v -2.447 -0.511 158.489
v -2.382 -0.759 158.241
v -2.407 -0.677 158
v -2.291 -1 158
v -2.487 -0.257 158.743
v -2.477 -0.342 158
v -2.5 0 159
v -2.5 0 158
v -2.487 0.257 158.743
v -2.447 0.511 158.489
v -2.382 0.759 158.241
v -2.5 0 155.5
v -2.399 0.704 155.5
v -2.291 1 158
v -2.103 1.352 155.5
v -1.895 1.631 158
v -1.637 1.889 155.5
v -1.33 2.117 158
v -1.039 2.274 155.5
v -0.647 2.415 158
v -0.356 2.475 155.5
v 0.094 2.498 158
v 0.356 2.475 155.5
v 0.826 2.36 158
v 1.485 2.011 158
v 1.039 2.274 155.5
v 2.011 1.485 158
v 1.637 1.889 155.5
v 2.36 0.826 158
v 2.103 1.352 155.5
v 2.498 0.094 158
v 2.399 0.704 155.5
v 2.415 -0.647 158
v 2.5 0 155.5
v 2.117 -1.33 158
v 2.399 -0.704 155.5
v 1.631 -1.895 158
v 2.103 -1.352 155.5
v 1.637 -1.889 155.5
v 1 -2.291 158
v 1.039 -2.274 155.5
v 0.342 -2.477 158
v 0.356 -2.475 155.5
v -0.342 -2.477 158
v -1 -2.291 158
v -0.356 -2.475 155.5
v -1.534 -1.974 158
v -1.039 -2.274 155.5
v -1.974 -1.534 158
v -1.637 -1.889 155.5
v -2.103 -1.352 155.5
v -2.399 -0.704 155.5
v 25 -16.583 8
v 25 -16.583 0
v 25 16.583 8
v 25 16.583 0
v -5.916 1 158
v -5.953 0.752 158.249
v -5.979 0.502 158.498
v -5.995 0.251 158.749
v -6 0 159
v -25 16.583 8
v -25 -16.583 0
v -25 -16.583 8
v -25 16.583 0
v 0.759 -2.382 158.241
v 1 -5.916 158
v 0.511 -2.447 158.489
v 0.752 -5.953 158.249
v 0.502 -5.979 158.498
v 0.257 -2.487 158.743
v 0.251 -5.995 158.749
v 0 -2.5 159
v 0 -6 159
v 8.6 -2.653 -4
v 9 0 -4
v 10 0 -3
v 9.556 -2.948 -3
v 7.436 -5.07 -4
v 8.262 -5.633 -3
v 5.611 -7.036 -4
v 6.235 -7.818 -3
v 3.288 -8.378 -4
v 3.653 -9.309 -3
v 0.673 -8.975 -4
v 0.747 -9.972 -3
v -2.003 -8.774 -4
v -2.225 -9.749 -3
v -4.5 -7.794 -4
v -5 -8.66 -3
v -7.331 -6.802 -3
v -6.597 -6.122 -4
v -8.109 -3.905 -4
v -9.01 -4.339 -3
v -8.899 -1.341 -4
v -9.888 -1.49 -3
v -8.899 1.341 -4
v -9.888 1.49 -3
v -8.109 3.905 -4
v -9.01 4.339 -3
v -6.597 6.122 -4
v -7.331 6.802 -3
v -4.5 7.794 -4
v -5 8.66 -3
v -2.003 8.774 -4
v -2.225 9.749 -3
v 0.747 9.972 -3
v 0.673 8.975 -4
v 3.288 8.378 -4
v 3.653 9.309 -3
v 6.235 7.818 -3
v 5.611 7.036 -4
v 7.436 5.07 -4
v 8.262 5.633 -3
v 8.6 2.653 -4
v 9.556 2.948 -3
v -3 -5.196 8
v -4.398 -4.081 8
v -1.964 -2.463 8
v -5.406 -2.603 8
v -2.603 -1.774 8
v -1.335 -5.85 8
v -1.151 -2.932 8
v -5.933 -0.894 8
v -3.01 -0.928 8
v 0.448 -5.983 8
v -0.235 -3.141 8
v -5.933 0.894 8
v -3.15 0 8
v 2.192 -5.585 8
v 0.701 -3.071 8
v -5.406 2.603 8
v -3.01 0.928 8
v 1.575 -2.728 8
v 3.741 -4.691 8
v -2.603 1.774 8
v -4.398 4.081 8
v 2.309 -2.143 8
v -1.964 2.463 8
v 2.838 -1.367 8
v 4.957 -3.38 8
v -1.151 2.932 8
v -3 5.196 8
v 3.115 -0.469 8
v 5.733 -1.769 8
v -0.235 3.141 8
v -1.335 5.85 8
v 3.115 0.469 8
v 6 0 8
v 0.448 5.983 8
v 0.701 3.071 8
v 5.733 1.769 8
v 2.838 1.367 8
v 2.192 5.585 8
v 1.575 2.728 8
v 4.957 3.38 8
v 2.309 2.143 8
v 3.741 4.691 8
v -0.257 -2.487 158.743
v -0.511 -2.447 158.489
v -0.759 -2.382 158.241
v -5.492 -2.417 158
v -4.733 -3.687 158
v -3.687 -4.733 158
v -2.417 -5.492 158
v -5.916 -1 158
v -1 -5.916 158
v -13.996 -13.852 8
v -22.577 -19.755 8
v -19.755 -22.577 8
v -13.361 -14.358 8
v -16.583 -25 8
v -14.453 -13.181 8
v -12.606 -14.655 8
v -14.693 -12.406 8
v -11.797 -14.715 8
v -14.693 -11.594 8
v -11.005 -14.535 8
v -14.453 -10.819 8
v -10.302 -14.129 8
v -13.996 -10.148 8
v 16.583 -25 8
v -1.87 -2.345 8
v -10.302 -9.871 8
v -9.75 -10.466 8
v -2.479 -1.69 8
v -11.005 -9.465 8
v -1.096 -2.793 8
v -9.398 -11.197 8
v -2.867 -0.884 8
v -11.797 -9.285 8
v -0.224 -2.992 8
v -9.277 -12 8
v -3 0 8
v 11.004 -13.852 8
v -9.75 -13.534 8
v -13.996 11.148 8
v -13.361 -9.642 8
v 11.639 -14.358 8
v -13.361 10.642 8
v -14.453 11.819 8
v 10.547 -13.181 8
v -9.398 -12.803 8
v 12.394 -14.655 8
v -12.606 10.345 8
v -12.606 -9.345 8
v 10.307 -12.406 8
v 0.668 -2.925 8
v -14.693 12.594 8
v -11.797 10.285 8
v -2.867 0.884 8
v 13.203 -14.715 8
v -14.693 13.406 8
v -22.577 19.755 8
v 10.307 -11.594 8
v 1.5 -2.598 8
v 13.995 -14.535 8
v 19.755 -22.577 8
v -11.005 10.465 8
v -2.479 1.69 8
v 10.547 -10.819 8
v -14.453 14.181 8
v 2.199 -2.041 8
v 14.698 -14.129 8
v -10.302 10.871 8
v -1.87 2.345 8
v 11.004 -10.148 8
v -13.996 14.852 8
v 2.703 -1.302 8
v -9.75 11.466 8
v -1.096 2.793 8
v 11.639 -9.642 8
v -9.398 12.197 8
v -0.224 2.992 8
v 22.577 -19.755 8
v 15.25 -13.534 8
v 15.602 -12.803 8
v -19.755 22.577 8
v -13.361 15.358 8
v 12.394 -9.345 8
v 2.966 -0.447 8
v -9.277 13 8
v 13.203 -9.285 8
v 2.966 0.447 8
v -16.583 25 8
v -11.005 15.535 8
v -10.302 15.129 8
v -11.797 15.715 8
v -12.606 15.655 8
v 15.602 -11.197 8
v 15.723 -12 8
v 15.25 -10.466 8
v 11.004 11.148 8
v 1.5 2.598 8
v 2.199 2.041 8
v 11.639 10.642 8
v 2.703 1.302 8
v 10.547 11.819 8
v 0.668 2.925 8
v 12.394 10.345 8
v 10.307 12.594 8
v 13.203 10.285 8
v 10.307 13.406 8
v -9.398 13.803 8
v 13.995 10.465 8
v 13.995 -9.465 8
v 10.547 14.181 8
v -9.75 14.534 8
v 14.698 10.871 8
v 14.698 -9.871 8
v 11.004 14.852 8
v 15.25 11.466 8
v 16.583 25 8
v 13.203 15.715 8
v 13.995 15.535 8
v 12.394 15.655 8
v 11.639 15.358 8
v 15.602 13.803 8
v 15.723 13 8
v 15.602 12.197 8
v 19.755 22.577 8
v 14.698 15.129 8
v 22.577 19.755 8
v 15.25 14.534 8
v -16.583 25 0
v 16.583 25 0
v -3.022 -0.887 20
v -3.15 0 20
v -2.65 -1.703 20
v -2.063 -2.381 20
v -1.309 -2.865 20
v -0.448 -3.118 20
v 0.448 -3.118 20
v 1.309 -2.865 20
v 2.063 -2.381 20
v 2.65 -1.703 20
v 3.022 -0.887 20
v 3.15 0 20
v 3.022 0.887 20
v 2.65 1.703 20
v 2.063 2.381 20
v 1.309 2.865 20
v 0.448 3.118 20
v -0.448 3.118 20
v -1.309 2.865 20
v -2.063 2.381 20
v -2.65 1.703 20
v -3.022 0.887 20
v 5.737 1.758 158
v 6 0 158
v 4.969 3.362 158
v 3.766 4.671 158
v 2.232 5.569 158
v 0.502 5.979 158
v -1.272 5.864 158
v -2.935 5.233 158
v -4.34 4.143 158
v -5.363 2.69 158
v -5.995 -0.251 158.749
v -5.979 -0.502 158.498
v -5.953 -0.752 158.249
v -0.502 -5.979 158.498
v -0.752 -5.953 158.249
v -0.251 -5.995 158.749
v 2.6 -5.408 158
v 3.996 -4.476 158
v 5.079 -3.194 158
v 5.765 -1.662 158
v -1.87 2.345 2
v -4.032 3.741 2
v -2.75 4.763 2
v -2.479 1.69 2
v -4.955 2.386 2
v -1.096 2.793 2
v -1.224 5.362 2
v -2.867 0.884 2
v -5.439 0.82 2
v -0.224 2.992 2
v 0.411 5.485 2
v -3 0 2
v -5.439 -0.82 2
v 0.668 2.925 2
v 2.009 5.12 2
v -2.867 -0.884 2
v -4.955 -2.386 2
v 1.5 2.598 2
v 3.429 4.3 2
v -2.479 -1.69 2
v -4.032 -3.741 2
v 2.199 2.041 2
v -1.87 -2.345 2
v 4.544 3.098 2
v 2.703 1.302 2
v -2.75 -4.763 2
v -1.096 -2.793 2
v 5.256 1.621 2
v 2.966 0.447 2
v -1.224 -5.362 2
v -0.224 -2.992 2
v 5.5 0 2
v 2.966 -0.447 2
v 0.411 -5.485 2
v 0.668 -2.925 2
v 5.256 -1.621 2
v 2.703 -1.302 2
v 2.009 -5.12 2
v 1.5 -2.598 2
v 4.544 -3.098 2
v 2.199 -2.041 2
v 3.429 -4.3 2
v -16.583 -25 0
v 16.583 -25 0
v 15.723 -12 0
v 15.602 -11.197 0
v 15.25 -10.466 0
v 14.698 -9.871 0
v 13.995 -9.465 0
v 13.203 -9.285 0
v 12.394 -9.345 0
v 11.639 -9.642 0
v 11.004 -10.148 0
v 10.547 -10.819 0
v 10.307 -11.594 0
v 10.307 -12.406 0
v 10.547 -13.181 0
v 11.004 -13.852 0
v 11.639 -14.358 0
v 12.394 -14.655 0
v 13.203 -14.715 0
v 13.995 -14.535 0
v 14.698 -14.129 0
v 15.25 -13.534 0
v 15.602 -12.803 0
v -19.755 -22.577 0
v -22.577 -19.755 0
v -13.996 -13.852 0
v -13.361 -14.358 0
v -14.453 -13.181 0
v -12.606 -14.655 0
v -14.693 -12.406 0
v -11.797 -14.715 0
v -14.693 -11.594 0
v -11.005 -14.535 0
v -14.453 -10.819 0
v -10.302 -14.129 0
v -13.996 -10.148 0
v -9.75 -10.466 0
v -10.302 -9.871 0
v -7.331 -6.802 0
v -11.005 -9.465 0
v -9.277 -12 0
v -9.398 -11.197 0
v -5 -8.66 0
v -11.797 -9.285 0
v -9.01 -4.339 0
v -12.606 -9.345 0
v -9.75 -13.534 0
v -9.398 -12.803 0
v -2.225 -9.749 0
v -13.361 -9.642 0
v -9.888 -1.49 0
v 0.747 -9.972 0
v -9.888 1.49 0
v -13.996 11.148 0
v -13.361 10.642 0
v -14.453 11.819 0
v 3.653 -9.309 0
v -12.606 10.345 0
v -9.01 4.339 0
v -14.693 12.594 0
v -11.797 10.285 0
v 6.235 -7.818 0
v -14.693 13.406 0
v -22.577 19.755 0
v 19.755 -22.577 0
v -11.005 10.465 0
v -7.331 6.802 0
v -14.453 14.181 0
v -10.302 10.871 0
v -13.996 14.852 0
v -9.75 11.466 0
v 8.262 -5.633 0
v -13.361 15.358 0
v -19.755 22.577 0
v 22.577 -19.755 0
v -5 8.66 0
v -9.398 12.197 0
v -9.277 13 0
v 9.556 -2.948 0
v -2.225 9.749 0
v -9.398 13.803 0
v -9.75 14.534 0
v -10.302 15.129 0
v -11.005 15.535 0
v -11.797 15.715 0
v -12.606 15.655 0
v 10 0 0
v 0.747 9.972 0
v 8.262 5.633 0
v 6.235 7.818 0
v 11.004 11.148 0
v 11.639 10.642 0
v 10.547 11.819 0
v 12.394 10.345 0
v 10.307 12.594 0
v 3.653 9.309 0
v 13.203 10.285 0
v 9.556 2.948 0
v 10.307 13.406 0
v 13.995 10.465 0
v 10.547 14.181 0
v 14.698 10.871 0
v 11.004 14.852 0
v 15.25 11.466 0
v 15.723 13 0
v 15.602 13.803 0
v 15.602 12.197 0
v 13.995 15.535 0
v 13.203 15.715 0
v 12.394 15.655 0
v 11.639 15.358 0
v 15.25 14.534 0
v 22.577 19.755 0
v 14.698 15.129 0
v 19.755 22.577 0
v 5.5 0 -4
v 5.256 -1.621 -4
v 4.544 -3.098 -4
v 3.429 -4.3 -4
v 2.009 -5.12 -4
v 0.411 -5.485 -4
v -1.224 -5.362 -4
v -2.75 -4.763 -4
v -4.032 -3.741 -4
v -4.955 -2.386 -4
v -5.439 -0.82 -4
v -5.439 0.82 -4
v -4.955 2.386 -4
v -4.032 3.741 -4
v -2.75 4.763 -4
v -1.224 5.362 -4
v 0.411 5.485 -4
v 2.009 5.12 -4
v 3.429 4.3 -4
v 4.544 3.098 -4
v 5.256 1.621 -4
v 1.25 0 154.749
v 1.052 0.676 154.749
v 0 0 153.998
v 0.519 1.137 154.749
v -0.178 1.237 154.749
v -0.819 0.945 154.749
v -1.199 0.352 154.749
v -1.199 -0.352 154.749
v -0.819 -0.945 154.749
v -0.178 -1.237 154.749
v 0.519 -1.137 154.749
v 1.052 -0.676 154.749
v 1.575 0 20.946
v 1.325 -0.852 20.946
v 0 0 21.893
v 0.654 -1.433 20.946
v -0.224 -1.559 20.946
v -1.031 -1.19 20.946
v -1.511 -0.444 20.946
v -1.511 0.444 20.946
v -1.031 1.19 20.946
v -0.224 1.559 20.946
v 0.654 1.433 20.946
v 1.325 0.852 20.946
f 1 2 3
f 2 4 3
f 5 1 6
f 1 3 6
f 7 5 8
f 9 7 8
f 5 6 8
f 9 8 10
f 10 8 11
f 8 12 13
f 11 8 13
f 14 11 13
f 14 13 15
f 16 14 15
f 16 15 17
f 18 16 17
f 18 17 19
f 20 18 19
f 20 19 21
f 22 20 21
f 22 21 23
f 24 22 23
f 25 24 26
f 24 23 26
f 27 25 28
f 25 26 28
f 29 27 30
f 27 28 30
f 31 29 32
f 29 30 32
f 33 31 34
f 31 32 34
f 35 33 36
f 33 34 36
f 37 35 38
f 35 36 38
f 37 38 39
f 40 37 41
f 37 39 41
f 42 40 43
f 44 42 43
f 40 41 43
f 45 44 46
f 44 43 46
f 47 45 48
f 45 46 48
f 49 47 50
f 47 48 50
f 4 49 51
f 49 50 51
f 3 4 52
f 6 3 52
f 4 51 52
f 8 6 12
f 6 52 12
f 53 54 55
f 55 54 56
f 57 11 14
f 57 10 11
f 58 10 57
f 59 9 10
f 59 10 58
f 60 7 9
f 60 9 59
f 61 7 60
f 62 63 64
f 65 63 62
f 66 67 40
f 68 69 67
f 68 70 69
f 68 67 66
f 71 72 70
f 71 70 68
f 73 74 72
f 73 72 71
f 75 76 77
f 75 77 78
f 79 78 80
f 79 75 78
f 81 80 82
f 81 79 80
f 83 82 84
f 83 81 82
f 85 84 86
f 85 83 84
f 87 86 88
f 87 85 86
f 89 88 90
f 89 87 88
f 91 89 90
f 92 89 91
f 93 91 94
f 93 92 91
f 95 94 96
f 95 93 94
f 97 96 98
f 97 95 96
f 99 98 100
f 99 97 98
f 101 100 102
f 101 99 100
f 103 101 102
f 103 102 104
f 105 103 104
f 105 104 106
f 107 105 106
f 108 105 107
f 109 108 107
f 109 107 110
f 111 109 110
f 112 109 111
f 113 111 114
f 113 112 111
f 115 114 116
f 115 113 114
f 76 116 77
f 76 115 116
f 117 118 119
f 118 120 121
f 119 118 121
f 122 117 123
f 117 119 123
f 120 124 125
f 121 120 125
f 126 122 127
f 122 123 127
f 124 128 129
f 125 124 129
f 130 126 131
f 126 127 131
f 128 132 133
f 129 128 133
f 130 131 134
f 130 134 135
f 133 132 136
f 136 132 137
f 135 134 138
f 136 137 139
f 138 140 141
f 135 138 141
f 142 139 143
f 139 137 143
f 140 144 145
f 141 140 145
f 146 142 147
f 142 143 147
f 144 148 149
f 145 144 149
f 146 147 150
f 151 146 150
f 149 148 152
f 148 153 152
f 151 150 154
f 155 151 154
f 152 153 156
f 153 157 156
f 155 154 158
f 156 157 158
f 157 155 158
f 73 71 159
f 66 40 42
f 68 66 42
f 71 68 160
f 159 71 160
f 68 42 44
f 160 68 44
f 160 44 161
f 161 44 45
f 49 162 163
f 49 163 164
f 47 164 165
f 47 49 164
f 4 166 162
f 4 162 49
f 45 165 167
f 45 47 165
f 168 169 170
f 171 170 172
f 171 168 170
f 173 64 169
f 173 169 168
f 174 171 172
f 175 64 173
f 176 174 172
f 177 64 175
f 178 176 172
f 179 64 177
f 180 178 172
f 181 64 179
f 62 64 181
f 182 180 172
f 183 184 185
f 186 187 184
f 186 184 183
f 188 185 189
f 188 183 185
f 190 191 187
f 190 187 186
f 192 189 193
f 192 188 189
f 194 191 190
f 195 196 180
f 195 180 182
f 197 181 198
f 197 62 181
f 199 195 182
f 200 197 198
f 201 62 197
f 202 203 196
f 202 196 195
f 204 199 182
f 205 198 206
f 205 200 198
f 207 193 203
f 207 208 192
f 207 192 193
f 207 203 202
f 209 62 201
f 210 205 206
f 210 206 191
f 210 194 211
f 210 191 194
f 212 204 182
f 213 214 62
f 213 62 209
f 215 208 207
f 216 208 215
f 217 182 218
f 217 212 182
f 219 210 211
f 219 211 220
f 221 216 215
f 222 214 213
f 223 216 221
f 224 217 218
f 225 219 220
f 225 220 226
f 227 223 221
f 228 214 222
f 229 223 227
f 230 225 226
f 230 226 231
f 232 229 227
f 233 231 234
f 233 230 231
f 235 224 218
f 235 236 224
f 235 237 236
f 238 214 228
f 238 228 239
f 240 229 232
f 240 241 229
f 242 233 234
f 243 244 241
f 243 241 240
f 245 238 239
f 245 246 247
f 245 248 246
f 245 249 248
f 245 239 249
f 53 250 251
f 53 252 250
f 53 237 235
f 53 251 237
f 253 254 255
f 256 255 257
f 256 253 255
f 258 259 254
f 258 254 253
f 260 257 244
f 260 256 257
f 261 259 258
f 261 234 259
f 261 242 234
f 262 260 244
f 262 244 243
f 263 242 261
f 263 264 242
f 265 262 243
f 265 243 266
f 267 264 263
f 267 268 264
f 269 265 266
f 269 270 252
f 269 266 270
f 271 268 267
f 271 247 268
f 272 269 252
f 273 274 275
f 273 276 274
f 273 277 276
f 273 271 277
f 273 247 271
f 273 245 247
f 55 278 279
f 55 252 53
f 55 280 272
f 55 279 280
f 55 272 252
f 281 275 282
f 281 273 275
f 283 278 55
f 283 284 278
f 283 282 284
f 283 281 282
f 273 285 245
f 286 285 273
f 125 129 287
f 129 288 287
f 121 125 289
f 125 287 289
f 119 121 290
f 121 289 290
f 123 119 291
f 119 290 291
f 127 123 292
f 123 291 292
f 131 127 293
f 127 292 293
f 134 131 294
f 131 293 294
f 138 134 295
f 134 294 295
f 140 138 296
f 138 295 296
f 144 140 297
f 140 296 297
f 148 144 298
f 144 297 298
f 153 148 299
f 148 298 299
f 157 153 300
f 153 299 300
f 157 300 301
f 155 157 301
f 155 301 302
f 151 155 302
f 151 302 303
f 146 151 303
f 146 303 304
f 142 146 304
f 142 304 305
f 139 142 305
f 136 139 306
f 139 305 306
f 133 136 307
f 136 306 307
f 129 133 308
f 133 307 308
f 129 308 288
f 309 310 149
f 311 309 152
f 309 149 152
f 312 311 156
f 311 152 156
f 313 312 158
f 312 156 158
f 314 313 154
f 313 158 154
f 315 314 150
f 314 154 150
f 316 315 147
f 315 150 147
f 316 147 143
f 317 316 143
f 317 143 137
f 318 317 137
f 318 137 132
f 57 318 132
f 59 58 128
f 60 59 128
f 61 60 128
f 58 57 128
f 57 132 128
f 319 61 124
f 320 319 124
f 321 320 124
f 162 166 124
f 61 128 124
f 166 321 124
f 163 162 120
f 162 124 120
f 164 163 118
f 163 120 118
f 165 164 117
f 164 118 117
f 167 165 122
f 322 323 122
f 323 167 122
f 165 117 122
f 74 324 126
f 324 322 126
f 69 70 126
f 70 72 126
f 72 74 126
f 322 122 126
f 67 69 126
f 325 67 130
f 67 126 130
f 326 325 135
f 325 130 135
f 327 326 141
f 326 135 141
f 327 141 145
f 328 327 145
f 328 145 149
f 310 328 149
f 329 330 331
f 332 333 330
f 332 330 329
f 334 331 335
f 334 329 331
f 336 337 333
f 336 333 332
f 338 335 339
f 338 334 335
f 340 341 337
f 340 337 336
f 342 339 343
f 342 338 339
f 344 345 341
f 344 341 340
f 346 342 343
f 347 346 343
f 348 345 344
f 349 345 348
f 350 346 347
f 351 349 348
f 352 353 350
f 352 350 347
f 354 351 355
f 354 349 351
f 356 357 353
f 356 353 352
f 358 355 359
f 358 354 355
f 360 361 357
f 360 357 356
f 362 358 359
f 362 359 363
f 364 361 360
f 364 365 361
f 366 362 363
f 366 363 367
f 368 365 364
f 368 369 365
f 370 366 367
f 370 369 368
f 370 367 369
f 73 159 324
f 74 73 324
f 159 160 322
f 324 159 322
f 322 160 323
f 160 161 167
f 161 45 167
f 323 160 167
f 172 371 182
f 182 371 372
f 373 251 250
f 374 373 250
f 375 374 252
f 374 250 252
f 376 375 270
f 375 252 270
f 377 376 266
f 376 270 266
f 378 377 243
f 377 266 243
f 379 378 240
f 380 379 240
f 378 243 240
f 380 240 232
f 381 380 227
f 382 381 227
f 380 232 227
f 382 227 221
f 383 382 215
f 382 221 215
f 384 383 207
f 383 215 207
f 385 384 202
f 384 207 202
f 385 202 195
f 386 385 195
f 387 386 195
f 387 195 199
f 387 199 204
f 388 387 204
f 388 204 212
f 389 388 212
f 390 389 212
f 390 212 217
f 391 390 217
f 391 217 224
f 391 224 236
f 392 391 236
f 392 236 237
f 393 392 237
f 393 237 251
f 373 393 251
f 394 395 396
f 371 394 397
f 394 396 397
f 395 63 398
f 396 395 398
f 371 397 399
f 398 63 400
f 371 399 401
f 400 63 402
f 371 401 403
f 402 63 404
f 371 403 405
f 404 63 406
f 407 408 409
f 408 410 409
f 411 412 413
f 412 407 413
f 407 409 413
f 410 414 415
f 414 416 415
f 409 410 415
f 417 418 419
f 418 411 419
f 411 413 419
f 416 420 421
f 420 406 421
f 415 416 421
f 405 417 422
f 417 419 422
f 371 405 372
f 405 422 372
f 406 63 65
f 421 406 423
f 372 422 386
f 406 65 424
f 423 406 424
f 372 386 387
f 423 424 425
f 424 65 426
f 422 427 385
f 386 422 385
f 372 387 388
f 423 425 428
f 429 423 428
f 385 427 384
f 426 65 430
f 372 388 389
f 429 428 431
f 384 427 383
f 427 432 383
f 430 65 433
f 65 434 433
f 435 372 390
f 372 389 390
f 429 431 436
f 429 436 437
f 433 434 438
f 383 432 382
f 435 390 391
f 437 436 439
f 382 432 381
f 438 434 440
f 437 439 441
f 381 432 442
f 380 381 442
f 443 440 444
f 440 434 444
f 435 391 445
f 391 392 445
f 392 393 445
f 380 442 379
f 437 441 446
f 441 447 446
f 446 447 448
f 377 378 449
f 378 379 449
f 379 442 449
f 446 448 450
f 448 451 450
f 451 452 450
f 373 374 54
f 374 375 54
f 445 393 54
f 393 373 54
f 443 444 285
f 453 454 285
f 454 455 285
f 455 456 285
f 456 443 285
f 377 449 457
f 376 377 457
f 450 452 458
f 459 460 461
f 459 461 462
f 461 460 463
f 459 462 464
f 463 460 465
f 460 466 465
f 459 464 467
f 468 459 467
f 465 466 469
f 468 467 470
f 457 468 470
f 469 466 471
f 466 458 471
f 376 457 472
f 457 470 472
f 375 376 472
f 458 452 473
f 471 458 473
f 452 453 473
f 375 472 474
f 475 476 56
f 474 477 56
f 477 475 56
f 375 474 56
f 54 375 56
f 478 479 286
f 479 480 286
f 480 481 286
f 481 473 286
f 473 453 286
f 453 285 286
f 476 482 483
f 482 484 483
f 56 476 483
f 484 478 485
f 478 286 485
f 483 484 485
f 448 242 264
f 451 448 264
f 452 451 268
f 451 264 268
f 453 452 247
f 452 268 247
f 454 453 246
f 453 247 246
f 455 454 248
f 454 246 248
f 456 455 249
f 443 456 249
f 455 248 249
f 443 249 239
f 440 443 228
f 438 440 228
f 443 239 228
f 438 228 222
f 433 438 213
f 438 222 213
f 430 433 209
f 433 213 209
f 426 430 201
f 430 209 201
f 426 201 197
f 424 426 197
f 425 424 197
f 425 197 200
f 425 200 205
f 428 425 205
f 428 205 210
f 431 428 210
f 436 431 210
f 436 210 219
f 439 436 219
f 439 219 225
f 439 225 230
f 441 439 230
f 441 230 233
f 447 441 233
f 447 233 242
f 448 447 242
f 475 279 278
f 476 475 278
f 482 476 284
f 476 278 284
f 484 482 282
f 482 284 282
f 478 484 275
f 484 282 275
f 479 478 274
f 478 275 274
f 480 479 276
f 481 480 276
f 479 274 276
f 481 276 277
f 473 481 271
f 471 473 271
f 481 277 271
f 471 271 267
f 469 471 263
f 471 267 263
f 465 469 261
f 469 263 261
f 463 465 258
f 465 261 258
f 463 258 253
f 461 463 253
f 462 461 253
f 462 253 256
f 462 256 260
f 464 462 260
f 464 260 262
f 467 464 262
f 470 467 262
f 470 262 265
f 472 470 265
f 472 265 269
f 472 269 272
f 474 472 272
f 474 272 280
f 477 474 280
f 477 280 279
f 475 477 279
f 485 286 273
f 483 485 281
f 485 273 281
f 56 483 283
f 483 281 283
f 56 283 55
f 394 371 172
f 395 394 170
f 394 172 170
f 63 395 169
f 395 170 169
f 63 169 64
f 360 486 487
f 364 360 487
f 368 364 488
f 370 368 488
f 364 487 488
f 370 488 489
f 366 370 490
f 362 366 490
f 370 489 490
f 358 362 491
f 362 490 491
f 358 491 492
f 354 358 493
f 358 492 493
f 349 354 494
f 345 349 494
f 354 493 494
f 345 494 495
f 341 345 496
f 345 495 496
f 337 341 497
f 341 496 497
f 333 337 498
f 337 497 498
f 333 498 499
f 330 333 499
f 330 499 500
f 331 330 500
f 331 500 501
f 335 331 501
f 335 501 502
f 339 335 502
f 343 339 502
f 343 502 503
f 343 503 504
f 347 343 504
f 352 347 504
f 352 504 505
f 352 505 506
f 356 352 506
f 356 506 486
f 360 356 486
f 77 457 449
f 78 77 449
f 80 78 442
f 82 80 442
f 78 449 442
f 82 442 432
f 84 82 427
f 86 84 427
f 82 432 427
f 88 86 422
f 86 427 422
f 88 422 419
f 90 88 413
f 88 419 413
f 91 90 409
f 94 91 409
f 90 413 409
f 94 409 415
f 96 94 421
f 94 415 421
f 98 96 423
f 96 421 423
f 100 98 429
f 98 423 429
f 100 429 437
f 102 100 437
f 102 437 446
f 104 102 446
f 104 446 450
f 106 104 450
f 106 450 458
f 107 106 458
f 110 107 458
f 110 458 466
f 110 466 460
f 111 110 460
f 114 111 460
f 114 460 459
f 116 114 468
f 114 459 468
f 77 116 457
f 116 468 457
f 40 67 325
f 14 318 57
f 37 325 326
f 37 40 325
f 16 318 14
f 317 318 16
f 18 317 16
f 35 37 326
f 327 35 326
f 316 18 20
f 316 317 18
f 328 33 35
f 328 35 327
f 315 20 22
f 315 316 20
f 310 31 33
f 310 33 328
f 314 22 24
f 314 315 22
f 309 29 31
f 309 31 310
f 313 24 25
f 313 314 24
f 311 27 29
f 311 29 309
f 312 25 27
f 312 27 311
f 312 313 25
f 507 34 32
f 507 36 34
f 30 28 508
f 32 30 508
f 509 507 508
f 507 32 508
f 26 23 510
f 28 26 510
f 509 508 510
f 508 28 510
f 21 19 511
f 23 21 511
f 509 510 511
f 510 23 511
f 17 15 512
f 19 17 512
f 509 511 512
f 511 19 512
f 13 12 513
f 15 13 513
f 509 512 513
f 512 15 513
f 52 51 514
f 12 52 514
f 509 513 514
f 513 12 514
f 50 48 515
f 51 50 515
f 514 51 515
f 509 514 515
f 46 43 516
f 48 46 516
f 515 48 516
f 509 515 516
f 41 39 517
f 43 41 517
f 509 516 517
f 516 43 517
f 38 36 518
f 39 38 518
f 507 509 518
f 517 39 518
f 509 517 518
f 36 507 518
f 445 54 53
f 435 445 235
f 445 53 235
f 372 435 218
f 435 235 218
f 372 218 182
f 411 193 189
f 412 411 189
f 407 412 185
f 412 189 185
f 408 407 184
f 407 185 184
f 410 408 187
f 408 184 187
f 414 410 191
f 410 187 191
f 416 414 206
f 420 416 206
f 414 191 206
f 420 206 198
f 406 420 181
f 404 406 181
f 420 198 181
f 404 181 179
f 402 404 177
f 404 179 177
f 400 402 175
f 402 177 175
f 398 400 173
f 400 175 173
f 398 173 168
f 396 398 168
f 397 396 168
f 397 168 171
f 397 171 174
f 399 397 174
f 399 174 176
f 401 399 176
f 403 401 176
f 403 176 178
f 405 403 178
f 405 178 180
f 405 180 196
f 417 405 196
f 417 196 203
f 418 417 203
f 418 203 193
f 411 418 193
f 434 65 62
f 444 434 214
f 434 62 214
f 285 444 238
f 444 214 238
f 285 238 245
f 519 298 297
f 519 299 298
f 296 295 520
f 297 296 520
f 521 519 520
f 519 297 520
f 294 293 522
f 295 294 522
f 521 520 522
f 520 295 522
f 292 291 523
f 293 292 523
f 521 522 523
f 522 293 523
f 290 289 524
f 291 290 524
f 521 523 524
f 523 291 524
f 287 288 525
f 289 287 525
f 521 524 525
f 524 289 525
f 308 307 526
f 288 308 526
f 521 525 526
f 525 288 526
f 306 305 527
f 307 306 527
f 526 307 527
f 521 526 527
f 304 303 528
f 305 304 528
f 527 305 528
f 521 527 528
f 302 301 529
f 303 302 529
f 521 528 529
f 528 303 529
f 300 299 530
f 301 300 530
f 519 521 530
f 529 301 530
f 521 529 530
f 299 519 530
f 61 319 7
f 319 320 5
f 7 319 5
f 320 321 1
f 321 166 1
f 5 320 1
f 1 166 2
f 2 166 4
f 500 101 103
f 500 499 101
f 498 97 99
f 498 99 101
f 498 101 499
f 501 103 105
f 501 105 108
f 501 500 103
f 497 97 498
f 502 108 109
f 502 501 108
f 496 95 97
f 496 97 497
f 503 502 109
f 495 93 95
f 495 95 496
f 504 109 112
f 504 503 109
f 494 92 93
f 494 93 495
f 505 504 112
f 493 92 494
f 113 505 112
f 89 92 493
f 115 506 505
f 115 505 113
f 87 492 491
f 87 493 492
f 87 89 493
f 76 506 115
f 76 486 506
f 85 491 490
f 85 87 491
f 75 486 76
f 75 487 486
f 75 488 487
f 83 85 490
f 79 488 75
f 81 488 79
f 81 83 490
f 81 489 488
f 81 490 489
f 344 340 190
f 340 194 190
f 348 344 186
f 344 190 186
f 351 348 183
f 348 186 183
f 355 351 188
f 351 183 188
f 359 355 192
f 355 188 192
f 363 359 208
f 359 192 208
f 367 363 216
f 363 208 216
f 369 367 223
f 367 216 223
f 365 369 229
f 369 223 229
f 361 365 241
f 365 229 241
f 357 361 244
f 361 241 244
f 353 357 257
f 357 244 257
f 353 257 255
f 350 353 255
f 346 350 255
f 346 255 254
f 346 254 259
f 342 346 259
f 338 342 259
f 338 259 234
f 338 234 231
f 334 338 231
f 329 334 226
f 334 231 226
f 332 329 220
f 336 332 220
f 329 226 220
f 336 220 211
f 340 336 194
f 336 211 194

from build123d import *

# Parameters (mm, degrees)
F0_W            = 50
F0_H            = 50
F1_DEPTH        = 8
F2_R            = 10
F3_DEPTH        = 4
F5_DEPTH        = 25
F4_R            = 6
F6_DEPTH        = 150
F7_R            = 2.7229388177
F8_DEPTH        = 25
F9_SIZE         = 1
F11_D           = 6
F11_CBORE_D     = 11
F11_CBORE_DEPTH = 6
F12_D           = 6.3
F12_DEPTH       = 12
F12_TIP         = 1.8927109499
F14_D           = 5
F14_DEPTH       = 2.5
F14_TIP         = 1.5021515476
F16_DEPTH       = 1
F17_SIZE        = 0.9999


# Not quite as in the source:
# - a fillet or chamfer is up to 0.001 mm smaller than in the source, because OpenCascade refuses the exact size


with BuildPart() as f1:
    # F0 (on Top) → F1 (new body)
    with BuildSketch(Plane.XY):
        Rectangle(F0_W, F0_H)
    extrude(amount=F1_DEPTH)

    # F2 (on face) → F3 (join)
    with BuildSketch(Plane(origin=(0, 0, 0), x_dir=(1, 0, 0), z_dir=(0, 0, -1))):
        Circle(F2_R)
    extrude(amount=F3_DEPTH)

    # F4 (on face) → F5 (cut)
    with BuildSketch(Plane.XY.offset(8)):
        with BuildLine():
            ThreePointArc((16.5831239518, 25), (21.2132034356, 21.2132034356), (25, 16.5831239518))
            Line((25, 16.5831239518), (25, 25))
            Line((25, 25), (16.5831239518, 25))
        make_face()
        with BuildLine():
            Line((25, -25), (25, -16.5831239518))
            ThreePointArc((25, -16.5831239518), (21.2132034356, -21.2132034356), (16.5831239518, -25))
            Line((16.5831239518, -25), (25, -25))
        make_face()
        with BuildLine():
            ThreePointArc((-16.5831239518, -25), (0, -30), (16.5831239518, -25))
            Line((16.5831239518, -25), (-16.5831239518, -25))
        make_face()
        with BuildLine():
            ThreePointArc((-25, 16.5831239518), (-21.2132034356, 21.2132034356), (-16.5831239518, 25))
            Line((-16.5831239518, 25), (-25, 25))
            Line((-25, 25), (-25, 16.5831239518))
        make_face()
        with BuildLine():
            Line((-25, -25), (-16.5831239518, -25))
            ThreePointArc((-16.5831239518, -25), (-21.2132034356, -21.2132034356), (-25, -16.5831239518))
            Line((-25, -16.5831239518), (-25, -25))
        make_face()
        with BuildLine():
            Line((-25, -16.5831239518), (-25, 16.5831239518))
            ThreePointArc((-25, 16.5831239518), (-30, 0), (-25, -16.5831239518))
        make_face()
    extrude(amount=-F5_DEPTH, mode=Mode.SUBTRACT)

    # F7 (on face) → F8 (cut)
    with BuildSketch(Plane.XY.offset(8)):
        with Locations((13, 13)):
            Circle(F7_R)
        with Locations((13, -12)):
            Circle(F7_R)
        with Locations((-12, -12)):
            Circle(F7_R)
        with Locations((-12, 13)):
            Circle(F7_R)
    extrude(amount=-F8_DEPTH, mode=Mode.SUBTRACT)

    # F9
    f9_edges = [f1.edges().sort_by_distance(p)[0] for p in [
        (-10, 0, -4),
    ]]
    chamfer(f9_edges, length=F9_SIZE)

    # F11 (through all)
    with Locations(Plane(origin=(0, 0, -4), x_dir=(1, 0, 0), z_dir=(0, 0, -1))):
        with Locations((0, 0)):
            CounterBoreHole(F11_D / 2, F11_CBORE_D / 2, F11_CBORE_DEPTH)


with BuildPart() as f6:
    # F4 (on face) → F6 (new body)
    with BuildSketch(Plane.XY.offset(8)):
        Circle(F4_R)
    extrude(amount=F6_DEPTH)

    # F12
    with Locations(Plane(origin=(0, 0, 8), x_dir=(1, 0, 0), z_dir=(0, 0, -1))):
        with Locations((0, 0)):
            Hole(F12_D / 2, depth=F12_DEPTH)
            with Locations((0, 0, -(F12_DEPTH + F12_TIP / 2))):  # 118° drill point
                Cone(0, F12_D / 2, F12_TIP, mode=Mode.SUBTRACT)

    # F14
    with Locations(Plane.XY.offset(158)):
        with Locations((0, 0)):
            Hole(F14_D / 2, depth=F14_DEPTH)
            with Locations((0, 0, -(F14_DEPTH + F14_TIP / 2))):  # 118° drill point
                Cone(0, F14_D / 2, F14_TIP, mode=Mode.SUBTRACT)

    # F15 (on face) → F16 (join)
    with BuildSketch(Plane.XY.offset(158)):
        with BuildLine():
            Line((-2.2912878475, 1), (-5.9160797831, 1))
            ThreePointArc((-5.9160797831, 1), (-6, 0), (-5.9160797831, -1))
            Line((-5.9160797831, -1), (-2.2912878475, -1))
            ThreePointArc((-2.2912878475, -1), (-2.5, 0), (-2.2912878475, 1))
        make_face()
        with BuildLine():
            ThreePointArc((-1, -5.9160797831), (0, -6), (1, -5.9160797831))
            Line((1, -5.9160797831), (1, -2.2912878475))
            ThreePointArc((1, -2.2912878475), (0, -2.5), (-1, -2.2912878475))
            Line((-1, -2.2912878475), (-1, -5.9160797831))
        make_face()
    extrude(amount=F16_DEPTH)

    # F17 (size 1 in the source; OpenCascade refuses exactly that, so slightly less here)
    f17_edges = [f6.edges().sort_by_distance(p)[0] for p in [
        (-4.103684, -1, 159),
        (-1, -4.103684, 159),
        (1, -4.103684, 159),
        (-4.103684, 1, 159),
    ]]
    chamfer(f17_edges, length=F17_SIZE)


solid = Compound([f1.part, f6.part])
